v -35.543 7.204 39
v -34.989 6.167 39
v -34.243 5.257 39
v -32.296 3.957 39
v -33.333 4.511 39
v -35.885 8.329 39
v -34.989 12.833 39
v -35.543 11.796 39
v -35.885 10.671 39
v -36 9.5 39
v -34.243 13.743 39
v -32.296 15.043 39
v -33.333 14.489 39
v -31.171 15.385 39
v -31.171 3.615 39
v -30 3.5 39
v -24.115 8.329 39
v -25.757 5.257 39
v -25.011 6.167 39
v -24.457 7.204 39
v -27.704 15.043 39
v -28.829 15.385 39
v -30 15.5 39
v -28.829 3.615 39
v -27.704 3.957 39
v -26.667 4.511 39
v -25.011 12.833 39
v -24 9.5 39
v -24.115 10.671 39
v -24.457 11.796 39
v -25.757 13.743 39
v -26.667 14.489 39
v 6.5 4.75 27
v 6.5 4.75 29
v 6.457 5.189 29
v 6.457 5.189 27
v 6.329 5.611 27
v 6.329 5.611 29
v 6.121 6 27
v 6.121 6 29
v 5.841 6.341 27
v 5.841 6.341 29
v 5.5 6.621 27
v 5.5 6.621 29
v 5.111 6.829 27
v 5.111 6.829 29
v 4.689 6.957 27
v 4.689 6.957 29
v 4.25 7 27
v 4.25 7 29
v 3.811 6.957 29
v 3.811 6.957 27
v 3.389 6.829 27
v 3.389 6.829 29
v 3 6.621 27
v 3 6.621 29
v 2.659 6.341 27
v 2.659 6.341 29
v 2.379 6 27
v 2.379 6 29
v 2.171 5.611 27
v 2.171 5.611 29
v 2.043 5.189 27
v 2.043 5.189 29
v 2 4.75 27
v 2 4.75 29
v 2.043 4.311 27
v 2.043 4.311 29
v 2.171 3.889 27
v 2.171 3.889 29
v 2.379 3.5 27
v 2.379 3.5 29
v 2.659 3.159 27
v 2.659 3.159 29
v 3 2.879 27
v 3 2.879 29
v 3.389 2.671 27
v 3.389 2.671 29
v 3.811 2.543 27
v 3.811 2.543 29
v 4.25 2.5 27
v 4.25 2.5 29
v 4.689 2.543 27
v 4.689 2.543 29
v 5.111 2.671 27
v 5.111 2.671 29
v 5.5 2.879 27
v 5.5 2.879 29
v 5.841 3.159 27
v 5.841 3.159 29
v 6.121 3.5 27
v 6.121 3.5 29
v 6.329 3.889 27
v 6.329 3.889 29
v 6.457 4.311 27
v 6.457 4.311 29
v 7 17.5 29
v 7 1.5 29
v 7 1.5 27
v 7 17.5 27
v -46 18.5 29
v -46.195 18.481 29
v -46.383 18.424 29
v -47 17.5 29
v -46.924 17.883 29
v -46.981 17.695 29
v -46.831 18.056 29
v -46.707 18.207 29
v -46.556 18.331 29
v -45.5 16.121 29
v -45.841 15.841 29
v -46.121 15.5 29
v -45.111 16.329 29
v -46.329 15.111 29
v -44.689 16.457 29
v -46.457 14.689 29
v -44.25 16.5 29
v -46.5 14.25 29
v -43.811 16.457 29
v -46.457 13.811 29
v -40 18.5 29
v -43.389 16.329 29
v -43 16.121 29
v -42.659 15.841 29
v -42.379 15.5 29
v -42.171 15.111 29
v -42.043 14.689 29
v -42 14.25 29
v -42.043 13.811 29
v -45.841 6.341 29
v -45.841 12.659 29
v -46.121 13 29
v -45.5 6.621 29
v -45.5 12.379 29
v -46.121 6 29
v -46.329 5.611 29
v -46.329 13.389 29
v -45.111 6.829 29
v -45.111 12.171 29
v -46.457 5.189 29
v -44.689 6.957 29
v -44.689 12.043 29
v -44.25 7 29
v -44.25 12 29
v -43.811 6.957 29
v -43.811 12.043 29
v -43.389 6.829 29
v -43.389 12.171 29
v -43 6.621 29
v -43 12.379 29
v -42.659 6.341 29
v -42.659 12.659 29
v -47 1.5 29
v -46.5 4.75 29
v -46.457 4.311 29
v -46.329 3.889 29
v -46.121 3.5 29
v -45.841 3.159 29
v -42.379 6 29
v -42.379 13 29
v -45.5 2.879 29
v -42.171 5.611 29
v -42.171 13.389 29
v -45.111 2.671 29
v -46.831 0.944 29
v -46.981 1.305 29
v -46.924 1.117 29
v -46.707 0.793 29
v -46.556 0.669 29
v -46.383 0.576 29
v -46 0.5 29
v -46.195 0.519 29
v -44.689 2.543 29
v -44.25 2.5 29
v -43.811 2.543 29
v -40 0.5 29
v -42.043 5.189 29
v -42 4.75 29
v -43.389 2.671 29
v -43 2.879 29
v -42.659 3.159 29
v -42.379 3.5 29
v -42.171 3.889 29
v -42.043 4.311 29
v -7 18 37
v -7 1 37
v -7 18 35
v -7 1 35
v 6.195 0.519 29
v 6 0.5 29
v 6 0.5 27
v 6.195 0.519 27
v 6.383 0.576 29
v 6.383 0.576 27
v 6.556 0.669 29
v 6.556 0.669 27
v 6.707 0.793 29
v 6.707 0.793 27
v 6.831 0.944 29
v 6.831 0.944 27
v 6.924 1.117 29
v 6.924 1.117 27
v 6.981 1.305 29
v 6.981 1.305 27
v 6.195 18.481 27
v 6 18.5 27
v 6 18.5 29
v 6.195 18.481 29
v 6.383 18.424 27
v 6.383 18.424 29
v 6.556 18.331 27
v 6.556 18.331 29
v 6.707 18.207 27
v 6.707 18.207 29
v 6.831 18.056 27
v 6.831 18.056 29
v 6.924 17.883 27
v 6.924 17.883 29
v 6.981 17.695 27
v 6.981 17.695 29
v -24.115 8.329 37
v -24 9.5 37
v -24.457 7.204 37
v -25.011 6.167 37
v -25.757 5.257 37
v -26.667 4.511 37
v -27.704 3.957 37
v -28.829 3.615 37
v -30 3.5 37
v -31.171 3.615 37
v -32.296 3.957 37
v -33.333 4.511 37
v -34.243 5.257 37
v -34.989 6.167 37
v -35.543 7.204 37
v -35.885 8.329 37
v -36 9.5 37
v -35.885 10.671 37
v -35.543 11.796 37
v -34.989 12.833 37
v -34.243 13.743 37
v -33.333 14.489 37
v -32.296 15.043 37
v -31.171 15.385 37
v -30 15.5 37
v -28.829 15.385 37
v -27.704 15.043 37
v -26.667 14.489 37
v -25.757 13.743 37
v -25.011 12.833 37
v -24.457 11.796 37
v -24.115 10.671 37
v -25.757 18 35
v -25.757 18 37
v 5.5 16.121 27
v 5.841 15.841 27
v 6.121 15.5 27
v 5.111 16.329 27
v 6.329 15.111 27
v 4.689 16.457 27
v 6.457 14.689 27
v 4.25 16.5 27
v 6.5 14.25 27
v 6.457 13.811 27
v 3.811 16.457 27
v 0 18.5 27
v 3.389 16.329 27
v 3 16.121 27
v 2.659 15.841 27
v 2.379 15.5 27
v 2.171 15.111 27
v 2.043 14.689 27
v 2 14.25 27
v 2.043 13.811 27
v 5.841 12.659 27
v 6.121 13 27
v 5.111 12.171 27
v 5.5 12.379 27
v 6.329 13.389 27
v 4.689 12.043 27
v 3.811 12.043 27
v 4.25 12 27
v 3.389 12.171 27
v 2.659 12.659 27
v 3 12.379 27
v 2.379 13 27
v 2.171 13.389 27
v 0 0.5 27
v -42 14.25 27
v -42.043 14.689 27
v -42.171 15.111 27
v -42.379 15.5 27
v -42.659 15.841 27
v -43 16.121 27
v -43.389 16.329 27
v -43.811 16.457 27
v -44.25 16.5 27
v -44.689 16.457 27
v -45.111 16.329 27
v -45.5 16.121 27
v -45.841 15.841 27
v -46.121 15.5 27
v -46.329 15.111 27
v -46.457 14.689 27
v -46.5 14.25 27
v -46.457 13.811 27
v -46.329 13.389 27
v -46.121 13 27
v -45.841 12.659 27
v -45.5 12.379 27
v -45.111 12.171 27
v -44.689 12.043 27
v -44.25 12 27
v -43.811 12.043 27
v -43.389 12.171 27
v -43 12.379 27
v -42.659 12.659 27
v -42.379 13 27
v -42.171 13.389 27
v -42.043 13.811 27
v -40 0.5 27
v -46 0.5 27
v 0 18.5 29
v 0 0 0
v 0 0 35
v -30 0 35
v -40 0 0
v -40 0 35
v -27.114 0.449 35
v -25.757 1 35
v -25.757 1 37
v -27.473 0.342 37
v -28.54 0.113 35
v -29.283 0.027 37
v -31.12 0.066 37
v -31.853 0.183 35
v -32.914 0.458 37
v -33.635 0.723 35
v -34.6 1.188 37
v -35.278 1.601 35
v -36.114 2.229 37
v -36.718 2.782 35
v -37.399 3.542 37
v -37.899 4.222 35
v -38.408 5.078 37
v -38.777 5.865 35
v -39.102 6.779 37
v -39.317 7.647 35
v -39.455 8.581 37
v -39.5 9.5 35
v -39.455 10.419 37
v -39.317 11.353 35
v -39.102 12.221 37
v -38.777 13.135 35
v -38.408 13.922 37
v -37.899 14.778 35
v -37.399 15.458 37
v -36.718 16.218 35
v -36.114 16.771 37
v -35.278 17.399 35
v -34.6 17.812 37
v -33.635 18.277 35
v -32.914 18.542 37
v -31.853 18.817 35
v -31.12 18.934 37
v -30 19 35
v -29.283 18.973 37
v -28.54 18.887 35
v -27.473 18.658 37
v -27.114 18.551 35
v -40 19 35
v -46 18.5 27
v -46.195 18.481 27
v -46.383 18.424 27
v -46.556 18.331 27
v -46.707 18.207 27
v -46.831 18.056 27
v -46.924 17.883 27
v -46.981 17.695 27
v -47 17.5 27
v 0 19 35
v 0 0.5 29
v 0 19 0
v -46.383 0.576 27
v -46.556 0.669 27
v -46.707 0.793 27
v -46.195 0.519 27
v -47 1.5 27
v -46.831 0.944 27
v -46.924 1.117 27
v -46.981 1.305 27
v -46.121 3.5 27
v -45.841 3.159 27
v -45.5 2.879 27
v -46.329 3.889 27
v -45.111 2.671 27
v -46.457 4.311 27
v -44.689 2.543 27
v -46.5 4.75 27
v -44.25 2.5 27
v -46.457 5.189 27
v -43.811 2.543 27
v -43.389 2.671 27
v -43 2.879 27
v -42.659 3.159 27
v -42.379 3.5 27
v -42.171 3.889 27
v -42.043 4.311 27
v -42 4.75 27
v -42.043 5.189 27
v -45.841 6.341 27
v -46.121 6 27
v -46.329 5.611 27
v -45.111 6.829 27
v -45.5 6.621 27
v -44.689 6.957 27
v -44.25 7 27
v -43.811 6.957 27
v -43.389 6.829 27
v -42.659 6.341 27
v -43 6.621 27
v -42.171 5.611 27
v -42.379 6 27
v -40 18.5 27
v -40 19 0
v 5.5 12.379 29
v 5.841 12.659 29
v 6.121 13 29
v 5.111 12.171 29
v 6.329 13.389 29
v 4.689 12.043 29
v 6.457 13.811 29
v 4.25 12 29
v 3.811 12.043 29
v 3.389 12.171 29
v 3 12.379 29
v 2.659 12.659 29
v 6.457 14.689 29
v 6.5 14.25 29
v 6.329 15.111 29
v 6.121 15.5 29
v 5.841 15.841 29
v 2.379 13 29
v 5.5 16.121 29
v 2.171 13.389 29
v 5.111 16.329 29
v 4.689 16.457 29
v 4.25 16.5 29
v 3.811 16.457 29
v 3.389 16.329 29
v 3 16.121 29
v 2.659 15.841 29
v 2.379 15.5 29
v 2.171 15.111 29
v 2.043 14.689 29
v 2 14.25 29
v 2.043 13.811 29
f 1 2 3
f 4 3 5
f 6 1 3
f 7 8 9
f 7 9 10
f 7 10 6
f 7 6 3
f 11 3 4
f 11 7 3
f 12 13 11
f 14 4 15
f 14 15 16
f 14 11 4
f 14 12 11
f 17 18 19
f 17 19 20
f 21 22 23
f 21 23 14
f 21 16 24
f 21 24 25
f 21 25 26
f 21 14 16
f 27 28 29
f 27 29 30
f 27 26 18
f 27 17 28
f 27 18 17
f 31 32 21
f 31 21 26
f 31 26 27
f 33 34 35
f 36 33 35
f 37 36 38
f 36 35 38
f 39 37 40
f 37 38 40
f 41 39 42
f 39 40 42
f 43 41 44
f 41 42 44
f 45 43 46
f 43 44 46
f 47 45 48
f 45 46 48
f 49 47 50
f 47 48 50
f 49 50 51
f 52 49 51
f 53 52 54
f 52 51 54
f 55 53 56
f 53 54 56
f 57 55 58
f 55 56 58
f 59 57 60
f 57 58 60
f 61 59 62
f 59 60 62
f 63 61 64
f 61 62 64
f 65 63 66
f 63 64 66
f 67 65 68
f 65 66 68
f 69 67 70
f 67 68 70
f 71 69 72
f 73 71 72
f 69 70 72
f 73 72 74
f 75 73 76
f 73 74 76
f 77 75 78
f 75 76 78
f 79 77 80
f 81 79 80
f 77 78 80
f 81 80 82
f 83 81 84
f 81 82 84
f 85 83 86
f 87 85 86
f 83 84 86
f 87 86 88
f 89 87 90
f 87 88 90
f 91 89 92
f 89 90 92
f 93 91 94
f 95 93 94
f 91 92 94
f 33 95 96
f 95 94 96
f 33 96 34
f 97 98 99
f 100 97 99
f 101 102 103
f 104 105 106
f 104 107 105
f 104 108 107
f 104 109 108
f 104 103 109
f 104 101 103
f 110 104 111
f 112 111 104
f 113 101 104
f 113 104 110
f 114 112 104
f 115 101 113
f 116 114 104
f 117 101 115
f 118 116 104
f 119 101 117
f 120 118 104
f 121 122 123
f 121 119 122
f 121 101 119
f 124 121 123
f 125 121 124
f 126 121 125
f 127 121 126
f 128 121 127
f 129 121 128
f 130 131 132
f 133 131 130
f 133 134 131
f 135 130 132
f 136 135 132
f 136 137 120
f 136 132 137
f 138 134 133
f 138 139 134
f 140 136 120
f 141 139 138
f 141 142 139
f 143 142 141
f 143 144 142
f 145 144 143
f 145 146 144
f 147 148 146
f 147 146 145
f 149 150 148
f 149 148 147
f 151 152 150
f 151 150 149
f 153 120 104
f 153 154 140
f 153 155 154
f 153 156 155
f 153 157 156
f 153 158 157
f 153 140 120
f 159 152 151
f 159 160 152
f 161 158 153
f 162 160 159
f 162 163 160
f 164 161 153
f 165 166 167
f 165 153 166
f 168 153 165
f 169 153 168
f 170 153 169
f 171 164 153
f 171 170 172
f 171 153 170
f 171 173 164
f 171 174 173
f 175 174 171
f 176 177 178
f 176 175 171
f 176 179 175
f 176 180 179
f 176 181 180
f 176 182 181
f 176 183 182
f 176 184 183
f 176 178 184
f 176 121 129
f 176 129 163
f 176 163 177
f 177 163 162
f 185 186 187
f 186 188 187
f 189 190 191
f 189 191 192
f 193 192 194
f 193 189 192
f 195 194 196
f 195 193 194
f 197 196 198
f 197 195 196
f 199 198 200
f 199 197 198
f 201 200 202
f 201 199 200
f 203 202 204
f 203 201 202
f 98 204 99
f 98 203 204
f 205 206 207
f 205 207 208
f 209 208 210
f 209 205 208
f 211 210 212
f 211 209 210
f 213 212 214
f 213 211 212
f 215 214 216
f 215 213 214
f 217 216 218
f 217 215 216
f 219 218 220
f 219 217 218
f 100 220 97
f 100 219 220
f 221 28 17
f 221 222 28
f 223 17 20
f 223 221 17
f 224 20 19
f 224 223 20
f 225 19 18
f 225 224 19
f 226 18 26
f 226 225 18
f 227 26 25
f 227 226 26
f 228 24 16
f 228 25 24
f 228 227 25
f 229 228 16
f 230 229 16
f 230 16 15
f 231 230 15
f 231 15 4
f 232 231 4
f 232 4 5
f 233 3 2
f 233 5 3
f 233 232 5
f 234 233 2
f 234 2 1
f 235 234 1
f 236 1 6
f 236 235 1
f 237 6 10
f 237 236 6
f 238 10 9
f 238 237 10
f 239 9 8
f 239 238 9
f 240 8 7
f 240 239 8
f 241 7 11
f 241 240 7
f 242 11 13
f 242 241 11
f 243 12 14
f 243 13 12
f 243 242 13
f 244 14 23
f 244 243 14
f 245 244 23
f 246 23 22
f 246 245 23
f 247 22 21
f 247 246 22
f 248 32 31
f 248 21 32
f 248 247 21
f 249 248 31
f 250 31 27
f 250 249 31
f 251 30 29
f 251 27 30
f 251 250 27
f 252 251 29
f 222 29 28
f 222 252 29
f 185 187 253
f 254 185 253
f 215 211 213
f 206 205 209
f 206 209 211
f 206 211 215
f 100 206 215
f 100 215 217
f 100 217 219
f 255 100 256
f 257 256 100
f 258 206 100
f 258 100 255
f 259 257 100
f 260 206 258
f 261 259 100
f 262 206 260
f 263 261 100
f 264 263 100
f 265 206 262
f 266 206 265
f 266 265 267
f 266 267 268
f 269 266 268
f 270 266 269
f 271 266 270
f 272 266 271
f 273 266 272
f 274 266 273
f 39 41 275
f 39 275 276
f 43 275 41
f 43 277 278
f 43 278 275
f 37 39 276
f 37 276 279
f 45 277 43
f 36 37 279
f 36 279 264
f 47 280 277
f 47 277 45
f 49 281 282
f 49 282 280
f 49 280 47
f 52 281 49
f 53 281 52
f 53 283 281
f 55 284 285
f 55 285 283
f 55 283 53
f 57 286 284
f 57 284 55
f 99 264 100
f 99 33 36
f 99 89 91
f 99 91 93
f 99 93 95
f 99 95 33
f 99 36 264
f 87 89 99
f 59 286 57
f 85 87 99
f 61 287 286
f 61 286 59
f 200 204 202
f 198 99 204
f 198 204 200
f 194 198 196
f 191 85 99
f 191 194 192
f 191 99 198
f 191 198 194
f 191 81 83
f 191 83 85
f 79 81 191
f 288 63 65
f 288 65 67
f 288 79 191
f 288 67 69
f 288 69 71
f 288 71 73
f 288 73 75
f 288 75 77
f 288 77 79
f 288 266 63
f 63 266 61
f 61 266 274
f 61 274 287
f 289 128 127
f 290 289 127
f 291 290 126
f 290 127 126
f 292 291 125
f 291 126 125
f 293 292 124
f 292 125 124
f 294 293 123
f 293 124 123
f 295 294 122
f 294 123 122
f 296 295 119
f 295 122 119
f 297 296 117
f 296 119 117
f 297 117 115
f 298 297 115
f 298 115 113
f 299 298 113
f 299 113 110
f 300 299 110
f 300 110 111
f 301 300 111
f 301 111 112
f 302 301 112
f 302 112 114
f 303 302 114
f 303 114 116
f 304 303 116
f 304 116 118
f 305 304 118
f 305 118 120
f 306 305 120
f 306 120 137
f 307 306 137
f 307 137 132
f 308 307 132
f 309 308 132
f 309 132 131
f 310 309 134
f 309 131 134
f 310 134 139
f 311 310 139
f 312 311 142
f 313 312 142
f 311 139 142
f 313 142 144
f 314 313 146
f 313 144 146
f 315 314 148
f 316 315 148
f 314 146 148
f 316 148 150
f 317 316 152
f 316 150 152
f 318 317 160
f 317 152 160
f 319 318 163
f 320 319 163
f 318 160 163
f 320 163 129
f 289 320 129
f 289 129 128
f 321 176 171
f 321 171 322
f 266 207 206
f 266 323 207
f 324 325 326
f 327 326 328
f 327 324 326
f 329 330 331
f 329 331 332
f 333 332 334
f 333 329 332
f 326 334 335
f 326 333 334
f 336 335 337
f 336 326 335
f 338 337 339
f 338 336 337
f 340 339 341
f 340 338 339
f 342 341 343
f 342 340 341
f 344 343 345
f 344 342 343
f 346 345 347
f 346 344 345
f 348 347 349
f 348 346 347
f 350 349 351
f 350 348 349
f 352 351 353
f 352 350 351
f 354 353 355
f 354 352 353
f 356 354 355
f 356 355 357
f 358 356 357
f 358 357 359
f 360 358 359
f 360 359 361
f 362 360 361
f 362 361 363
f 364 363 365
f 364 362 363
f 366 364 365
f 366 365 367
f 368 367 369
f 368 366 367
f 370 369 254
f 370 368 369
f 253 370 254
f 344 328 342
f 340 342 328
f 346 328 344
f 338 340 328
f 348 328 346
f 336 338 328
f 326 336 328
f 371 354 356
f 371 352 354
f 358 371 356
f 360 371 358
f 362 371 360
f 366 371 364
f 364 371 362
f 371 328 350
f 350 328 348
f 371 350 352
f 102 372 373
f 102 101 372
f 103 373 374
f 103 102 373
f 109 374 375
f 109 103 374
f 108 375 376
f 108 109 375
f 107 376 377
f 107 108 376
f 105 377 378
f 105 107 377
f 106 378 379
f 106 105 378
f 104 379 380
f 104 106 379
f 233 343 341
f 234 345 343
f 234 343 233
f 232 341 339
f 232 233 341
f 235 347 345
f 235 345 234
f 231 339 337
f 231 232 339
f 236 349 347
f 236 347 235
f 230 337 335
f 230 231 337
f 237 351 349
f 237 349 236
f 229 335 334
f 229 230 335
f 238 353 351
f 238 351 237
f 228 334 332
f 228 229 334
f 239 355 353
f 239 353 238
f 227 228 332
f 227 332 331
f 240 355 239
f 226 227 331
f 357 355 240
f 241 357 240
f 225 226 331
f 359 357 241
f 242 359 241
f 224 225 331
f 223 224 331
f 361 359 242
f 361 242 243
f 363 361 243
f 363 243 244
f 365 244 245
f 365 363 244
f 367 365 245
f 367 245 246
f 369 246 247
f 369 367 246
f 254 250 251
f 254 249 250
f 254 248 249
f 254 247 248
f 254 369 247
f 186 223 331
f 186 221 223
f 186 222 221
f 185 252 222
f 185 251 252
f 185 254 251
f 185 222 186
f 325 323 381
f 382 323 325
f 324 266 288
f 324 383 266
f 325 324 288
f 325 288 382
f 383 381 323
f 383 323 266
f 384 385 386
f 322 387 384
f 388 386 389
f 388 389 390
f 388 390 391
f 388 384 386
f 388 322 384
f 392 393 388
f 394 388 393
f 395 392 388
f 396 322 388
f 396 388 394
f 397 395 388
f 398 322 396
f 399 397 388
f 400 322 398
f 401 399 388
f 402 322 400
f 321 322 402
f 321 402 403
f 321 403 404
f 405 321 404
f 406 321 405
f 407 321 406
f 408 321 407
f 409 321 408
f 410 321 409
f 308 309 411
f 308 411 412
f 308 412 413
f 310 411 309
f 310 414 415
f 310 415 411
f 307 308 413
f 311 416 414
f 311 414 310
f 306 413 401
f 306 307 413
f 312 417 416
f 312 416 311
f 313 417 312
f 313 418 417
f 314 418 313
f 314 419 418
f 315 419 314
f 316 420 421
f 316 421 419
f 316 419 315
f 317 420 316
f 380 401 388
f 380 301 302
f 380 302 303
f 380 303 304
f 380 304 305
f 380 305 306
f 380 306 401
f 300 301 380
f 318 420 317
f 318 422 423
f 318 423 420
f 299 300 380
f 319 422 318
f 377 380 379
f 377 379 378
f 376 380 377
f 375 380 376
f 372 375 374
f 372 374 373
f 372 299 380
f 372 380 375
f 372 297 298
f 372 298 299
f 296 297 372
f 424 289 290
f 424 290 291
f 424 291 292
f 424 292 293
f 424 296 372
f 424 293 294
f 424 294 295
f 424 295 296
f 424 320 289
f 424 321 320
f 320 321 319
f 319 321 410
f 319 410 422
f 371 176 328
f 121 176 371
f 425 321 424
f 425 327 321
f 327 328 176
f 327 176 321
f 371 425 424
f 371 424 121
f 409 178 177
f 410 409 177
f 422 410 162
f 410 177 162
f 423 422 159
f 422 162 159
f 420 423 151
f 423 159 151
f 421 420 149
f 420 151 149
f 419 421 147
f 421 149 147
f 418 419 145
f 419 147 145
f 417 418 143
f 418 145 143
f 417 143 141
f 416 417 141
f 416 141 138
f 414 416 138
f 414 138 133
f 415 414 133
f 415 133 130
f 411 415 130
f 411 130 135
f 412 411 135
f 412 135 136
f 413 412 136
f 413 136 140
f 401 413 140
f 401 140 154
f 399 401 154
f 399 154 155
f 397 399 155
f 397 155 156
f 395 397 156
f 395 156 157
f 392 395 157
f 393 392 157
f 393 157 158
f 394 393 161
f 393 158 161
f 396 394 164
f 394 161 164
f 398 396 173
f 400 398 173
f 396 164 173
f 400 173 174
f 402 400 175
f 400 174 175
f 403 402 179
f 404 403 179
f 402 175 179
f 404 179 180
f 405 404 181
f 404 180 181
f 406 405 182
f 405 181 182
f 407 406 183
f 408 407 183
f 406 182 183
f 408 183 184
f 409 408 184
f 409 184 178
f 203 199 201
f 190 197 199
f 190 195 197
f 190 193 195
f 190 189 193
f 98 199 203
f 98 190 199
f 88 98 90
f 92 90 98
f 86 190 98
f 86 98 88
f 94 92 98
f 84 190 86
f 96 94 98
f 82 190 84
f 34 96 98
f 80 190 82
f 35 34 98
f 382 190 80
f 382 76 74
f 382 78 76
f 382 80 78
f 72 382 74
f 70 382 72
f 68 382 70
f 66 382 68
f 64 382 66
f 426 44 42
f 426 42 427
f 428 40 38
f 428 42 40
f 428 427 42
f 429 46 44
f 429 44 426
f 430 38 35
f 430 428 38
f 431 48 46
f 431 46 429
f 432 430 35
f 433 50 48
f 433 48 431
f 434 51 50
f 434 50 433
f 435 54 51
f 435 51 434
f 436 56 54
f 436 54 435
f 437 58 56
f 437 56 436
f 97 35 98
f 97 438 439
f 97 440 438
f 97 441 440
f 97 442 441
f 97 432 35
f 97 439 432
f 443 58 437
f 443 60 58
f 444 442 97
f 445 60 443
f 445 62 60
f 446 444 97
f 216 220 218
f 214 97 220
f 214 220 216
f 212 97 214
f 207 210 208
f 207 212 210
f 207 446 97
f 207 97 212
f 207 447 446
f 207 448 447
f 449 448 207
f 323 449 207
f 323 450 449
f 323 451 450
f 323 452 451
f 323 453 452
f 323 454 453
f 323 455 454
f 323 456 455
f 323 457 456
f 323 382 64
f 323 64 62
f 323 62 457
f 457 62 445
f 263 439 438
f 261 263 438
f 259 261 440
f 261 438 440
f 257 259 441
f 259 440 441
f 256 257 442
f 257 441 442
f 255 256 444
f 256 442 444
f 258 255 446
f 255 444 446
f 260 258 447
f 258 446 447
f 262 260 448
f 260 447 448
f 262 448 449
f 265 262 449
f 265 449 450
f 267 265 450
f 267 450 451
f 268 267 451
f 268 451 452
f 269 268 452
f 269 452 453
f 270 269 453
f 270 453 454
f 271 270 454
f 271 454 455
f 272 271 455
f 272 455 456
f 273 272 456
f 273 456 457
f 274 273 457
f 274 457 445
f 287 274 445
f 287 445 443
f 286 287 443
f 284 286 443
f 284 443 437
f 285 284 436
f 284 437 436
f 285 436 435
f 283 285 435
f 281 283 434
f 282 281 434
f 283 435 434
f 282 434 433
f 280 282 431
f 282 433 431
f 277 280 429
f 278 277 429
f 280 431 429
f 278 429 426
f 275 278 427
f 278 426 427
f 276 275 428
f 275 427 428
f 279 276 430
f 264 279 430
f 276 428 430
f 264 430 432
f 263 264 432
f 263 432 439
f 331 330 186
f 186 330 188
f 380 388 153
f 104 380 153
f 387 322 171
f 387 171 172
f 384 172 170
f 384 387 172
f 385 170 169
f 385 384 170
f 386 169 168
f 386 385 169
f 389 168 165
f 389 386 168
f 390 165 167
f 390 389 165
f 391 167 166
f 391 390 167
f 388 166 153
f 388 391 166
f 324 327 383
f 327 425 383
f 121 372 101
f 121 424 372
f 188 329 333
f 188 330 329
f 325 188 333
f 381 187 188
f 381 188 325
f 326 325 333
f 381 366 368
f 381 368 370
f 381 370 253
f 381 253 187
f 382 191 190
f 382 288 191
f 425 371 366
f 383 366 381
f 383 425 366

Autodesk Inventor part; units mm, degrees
ref_plane "YZ Plane" through (0, 0, 0) normal (1, 0, 0) x (0, 1, 0)
ref_plane "XZ Plane" through (0, 0, 0) normal (0, 1, 0) x (-1, 0, 0)
ref_plane "XY Plane" through (0, 0, 0) normal (0, 0, 1) x (1, 0, 0)
sketch "Skizze1" plane through (0, 0, 0) normal (0, 0, 1) x (1, 0, 0)
  line L0 (0, 0) -> (-40, 0)
  line L1 (-40, 0) -> (-40, 19)
  line L2 (-40, 19) -> (0, 19)
  line L3 (0, 19) -> (0, 0)
  dimension "d0" = 40
  dimension "d1" = 19
extrude "Extrusion1" add sketch "Skizze1" along normal blind 35
sketch "Skizze2" plane through (0, 0, 35) normal (0, 0, 1) x (1, 0, 0)
  line L0 (-40, 19) -> (0, 19) projected
  circle A0 centre (-30, 9.5) radius 9.5
  dimension "d4" = 10
extrude "Extrusion2" add sketch "Skizze2" along normal blind 2
sketch "Skizze3" plane through (0, 0, 35) normal (0, 0, 1) x (1, 0, 0)
  line L0 (0, 19) -> (0, 0) projected
  line L1 (-37, 3.6605) -> (-37, 17.3389)
  line L2 (-7, 1) -> (-7, 18)
  line L3 (-7, 18) -> (-30, 18)
  line L4 (-30, 18) -> (-30, 1)
  line L5 (-30, 1) -> (-7, 1)
  dimension "d13" = 17
extrude "Extrusion3" add sketch "Skizze3" along normal blind 2
sketch "Skizze4" plane through (0, 0, 37) normal (0, 0, 1) x (1, 0, 0)
  arc A0 (-25.7574, 18) -> (-25.7574, 1) centre (-30, 9.5) ccw projected
  circle A1 centre (-30, 9.5) radius 6
  point P0 (0, 0)
  dimension "d16" = 12
extrude "Extrusion4" add sketch "Skizze4" along normal blind 2
sketch "Skizze6" plane through (-40, 0, 0) normal (-1, 0, 0) x (0, 0, 1)
  line L0 (27, 18.5) -> (29, 18.5)
  line L1 (29, 18.5) -> (29, 0.5)
  line L2 (29, 0.5) -> (27, 0.5)
  line L3 (27, 0.5) -> (27, 18.5)
  dimension "d23" = 2
  dimension "d24" = 18
extrude "Extrusion5" add sketch "Skizze6" along normal blind 7
sketch "Skizze7" plane through (-40, 0.5, 29) normal (0, 0, 1) x (1, 0, 0)
  circle A0 centre (-4.25, 4.25) radius 2.25
  circle A1 centre (-4.25, 13.75) radius 2.25
  point P0 (40, -0.5)
  dimension "d27" = 4.5
  dimension "d28" = 4.5
extrude "Extrusion6" cut sketch "Skizze7" against normal blind 2 contours A0
sketch "Skizze8" plane through (-40, 0.5, 29) normal (0, 0, 1) x (1, 0, 0)
  circle A0 centre (-4.25, 13.75) radius 2.25
  point P0 (40, -0.5)
  dimension "d31" = 4.5
extrude "Extrusion7" cut sketch "Skizze8" against normal blind 2
fillet "Rundung1" radius 1 1 edges at (-47, 0.5, 28)
fillet "Rundung2" radius 1 1 edges at (-47, 18.5, 28)
sketch "Skizze9" plane through (0, 0, 0) normal (1, 0, 0) x (0, 0, -1)
  line L0 (-27, 0.5) -> (-29, 0.5)
  line L1 (-29, 0.5) -> (-29, 18.5)
  line L2 (-29, 18.5) -> (-27, 18.5)
  line L3 (-27, 18.5) -> (-27, 0.5)
  dimension "d36" = 2
  dimension "d37" = 18
extrude "Extrusion8" add sketch "Skizze9" along normal blind 7
sketch "Skizze10" plane through (0, 0.5, 29) normal (0, 0, 1) x (1, 0, 0)
  circle A0 centre (4.25, 4.25) radius 2.25
  point P0 (0, -0.5)
  dimension "d40" = 4.5
extrude "Extrusion9" cut sketch "Skizze10" against normal blind 2
sketch "Skizze11" plane through (0, 0.5, 29) normal (0, 0, 1) x (1, 0, 0)
  circle A0 centre (4.25, 13.75) radius 2.25
  point P0 (0, -0.5)
  dimension "d43" = 4.5
extrude "Extrusion10" cut sketch "Skizze11" against normal blind 2
fillet "Rundung3" radius 1 1 edges at (7, 18.5, 28)
fillet "Rundung4" radius 1 1 edges at (7, 0.5, 28)
properties part number "servo" material "PC/ABS-Kunststoff"
